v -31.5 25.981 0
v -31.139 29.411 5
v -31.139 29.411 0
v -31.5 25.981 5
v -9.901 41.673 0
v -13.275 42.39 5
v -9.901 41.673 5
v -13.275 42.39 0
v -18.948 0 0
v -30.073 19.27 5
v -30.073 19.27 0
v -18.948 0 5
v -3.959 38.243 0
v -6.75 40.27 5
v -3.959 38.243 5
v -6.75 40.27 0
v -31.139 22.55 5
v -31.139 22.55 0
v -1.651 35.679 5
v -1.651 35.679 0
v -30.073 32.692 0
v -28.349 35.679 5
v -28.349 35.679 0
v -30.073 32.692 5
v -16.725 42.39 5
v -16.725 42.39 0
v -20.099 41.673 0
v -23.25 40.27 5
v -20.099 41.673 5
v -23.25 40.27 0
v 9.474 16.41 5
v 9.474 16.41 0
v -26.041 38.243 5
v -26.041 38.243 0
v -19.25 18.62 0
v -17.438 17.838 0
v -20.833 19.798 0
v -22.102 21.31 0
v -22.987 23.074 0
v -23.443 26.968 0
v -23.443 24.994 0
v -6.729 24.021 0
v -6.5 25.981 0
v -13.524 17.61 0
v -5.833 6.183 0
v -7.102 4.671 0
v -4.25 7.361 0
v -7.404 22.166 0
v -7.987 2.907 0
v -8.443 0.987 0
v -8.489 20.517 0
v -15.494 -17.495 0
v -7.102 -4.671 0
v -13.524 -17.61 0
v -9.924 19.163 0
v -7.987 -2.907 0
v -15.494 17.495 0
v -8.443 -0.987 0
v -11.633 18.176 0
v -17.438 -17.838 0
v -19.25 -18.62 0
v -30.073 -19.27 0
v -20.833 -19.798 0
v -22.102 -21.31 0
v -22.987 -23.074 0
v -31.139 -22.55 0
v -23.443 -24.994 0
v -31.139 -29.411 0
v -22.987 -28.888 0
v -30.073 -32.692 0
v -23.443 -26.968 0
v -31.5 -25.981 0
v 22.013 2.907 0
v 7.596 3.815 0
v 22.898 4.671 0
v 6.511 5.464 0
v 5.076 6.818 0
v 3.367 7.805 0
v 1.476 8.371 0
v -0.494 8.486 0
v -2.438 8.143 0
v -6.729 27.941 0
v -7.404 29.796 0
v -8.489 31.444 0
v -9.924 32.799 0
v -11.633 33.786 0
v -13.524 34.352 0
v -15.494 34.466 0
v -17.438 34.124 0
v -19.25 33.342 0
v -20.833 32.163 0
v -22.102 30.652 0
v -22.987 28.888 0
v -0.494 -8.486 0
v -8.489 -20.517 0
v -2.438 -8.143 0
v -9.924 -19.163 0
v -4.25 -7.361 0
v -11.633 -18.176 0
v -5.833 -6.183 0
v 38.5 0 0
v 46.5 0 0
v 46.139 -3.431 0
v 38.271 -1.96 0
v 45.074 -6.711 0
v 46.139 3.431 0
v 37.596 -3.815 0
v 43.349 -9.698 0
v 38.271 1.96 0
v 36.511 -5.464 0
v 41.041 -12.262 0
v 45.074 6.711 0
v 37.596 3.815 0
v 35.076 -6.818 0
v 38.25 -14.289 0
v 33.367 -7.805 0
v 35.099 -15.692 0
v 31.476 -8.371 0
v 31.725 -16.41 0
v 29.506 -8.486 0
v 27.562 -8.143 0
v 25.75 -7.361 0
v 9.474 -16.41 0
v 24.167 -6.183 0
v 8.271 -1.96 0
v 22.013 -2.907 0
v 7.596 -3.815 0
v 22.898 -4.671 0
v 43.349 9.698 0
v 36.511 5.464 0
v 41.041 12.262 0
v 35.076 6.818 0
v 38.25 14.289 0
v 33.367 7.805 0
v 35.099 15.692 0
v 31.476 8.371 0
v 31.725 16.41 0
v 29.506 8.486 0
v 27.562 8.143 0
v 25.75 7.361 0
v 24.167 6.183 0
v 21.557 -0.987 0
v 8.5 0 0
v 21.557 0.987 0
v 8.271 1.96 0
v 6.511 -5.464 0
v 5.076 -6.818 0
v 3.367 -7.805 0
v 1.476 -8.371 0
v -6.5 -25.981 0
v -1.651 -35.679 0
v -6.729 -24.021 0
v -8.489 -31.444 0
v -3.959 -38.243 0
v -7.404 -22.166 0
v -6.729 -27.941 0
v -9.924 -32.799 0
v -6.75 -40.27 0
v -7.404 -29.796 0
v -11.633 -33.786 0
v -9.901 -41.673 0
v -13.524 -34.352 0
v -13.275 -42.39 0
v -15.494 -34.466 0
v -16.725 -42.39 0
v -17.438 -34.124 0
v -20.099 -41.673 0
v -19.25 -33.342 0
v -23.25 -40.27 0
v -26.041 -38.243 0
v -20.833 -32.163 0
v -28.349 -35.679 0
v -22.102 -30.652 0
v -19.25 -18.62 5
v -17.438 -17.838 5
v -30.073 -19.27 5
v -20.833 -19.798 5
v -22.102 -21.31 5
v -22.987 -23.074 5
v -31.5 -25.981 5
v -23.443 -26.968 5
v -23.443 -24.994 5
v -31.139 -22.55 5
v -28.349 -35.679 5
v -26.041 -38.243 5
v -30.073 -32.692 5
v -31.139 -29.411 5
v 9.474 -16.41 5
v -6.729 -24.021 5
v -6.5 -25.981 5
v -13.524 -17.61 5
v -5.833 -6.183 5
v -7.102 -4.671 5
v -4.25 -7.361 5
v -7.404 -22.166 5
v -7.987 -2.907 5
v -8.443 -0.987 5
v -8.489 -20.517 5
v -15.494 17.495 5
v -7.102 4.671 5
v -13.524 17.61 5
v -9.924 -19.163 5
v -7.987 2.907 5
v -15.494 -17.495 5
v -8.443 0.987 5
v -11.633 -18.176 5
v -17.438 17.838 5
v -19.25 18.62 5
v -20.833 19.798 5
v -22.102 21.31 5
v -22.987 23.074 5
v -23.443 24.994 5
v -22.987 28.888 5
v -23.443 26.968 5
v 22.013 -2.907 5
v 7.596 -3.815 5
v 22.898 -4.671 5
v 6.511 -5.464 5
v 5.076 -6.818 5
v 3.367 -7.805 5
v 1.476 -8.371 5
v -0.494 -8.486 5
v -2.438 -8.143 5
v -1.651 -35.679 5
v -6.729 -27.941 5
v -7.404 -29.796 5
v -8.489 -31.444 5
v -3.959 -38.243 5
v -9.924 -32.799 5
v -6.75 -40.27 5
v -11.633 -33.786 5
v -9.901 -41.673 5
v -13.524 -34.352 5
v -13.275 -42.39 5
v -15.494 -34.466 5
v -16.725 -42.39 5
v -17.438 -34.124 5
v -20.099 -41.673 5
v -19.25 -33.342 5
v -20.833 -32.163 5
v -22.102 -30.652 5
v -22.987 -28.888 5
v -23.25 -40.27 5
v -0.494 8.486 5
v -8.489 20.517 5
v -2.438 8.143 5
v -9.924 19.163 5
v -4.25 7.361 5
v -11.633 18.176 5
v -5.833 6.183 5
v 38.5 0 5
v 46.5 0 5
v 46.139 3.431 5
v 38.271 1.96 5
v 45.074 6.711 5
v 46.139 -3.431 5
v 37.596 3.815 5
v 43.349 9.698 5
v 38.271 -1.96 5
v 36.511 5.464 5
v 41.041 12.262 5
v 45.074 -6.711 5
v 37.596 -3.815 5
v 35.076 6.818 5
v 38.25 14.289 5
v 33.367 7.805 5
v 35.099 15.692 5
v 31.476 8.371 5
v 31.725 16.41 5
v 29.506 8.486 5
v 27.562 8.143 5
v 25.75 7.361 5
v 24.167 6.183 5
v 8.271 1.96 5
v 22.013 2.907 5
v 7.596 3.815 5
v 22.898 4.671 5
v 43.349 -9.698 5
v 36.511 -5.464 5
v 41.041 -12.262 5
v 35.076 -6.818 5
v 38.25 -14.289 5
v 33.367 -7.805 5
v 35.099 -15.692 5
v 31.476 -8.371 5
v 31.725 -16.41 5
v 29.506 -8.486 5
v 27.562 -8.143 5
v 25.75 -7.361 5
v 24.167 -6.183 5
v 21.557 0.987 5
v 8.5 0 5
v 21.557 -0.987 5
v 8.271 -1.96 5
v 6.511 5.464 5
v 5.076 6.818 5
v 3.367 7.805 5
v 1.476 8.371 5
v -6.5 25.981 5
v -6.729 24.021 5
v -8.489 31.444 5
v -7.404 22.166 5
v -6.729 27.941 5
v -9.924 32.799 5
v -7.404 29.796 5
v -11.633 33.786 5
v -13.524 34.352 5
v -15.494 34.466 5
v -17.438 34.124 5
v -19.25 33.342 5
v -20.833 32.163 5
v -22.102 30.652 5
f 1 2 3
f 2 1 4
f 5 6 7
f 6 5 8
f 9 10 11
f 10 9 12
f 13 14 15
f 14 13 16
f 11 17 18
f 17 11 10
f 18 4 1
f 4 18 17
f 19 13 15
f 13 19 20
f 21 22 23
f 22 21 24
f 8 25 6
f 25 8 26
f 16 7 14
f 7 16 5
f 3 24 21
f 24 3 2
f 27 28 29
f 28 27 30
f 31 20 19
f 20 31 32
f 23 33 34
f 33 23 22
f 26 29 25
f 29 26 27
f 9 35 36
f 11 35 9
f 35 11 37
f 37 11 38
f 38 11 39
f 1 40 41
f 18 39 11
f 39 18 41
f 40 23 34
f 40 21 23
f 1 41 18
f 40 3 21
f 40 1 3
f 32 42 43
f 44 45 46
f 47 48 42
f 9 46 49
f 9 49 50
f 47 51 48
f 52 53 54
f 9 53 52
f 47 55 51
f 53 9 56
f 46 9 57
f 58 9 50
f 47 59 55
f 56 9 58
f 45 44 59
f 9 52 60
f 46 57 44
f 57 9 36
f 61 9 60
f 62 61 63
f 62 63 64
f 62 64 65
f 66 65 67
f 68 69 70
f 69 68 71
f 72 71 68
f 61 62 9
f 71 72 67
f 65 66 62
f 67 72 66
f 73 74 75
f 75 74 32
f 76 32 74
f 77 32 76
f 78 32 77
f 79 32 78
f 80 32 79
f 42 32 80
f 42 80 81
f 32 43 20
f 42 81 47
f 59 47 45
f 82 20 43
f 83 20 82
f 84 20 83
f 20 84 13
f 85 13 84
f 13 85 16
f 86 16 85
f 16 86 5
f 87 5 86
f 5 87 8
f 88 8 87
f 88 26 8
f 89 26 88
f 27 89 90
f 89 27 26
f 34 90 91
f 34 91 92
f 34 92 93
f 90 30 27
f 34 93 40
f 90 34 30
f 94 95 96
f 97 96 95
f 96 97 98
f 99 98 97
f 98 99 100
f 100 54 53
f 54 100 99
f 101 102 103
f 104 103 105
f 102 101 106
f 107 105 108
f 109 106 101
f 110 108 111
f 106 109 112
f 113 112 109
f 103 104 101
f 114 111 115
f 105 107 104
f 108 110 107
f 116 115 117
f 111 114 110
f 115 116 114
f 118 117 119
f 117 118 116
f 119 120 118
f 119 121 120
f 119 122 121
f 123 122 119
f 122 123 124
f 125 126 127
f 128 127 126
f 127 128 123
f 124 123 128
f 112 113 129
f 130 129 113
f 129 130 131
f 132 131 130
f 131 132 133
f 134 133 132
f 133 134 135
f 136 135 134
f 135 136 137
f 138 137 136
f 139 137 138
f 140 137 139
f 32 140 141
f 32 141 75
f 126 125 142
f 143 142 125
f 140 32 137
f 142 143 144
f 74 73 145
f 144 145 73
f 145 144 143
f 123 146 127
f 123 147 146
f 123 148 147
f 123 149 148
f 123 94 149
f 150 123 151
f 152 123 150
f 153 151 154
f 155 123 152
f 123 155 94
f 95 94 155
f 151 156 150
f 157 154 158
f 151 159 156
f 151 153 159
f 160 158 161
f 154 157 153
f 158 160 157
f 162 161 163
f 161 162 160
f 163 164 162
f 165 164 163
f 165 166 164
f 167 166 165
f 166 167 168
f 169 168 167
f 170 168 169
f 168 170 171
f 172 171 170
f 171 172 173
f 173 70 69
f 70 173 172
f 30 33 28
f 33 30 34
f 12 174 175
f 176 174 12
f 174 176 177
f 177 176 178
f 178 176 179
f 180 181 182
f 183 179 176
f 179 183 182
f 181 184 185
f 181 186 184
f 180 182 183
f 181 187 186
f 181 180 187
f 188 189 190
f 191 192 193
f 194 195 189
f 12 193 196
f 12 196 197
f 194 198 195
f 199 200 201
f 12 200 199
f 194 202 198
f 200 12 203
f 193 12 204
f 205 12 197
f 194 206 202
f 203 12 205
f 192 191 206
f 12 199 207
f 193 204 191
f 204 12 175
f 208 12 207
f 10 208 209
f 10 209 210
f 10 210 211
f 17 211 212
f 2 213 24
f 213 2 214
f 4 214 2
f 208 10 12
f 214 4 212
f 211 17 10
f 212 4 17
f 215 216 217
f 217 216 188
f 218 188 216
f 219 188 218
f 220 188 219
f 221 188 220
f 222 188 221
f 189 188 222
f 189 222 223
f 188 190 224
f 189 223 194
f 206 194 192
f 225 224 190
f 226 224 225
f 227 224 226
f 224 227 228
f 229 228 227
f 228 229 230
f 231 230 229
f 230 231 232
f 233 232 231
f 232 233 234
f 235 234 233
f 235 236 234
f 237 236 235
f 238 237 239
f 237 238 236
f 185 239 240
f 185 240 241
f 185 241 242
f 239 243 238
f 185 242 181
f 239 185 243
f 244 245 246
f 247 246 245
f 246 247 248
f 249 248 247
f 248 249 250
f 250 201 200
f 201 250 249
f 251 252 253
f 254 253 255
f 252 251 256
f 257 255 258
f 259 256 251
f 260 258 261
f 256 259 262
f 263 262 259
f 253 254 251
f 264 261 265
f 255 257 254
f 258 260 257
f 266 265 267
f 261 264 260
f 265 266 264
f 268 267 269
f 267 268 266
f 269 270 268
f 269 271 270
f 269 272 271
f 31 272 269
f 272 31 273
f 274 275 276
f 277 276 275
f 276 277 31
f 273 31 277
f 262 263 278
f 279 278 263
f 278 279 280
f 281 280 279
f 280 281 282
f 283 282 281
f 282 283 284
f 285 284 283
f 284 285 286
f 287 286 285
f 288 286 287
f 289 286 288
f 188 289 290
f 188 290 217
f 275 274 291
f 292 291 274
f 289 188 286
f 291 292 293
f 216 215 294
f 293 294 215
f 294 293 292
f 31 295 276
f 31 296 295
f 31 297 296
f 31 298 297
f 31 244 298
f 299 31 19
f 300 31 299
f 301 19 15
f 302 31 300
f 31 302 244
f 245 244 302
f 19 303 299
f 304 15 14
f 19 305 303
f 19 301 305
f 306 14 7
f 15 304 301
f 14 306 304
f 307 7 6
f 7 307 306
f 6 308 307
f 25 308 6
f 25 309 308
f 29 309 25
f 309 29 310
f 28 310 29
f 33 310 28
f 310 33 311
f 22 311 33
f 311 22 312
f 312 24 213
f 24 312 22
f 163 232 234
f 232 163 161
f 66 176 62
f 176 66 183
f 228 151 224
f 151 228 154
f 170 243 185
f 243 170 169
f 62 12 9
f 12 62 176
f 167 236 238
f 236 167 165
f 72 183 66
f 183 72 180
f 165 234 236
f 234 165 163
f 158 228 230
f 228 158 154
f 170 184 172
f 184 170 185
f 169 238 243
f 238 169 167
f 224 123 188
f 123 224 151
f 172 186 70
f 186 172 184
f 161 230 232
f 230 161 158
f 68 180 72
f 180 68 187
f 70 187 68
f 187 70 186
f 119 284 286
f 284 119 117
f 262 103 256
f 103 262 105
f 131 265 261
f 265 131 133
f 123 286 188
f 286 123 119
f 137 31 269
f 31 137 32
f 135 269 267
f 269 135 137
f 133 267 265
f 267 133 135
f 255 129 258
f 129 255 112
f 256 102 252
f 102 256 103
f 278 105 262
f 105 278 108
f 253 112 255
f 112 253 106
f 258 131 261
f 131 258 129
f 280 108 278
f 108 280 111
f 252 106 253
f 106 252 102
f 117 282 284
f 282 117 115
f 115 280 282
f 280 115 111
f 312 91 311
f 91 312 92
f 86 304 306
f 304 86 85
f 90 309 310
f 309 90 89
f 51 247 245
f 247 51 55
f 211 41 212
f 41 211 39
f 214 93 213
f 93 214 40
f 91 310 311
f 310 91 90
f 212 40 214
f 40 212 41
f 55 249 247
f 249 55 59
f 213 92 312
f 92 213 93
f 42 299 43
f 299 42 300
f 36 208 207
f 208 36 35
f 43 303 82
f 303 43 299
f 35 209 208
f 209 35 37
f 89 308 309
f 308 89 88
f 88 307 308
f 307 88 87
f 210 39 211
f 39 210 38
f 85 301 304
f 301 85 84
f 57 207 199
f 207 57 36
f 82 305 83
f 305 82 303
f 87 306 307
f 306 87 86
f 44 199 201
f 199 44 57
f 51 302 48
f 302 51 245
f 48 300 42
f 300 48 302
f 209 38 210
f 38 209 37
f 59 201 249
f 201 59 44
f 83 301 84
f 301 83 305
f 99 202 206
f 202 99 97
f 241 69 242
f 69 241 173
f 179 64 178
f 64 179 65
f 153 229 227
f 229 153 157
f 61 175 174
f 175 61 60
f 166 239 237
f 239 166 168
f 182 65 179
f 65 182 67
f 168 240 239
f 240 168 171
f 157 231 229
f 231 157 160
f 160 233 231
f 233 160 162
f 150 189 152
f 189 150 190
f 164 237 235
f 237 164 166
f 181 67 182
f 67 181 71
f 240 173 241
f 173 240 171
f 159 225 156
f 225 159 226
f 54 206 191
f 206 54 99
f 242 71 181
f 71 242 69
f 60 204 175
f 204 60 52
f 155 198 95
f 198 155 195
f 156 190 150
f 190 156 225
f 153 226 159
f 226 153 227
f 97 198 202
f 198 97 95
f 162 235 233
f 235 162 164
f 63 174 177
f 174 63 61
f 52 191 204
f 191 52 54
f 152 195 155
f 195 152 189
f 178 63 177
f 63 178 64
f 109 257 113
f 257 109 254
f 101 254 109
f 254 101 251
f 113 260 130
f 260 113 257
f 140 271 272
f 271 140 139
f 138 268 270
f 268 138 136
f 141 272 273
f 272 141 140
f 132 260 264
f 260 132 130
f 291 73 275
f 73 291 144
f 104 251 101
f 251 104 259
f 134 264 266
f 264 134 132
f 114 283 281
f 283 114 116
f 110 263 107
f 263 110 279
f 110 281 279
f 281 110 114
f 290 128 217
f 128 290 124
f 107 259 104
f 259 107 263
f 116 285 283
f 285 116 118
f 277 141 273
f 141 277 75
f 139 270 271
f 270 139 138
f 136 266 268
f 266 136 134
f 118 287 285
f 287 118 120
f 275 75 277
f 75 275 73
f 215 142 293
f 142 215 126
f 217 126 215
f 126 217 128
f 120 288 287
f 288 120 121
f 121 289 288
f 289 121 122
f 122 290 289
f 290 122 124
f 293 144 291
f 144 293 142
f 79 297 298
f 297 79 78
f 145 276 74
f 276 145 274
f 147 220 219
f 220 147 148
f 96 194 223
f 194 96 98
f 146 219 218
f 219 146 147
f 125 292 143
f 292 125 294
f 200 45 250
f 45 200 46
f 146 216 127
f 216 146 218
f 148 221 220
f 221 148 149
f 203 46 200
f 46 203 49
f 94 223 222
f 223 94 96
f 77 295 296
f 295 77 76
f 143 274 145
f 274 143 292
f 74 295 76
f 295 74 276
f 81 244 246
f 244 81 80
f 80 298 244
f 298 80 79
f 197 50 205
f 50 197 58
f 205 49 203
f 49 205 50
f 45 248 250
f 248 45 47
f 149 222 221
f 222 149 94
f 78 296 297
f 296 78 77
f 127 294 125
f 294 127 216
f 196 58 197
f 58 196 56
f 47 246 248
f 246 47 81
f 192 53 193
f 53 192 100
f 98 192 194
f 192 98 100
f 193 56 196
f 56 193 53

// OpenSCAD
outerBearings = 3;
bearingDistance = 30;
thickness = 8;
bearingRadius = 8.5;
bearingHeight = 5;

difference(){
union(){
    
    for(i=[1:outerBearings]){
        hull(){
            rotate([0,0,(360/outerBearings)*i]){
                translate([bearingDistance,0,0]){
                    cylinder(bearingHeight, r=bearingRadius+thickness,true);
                }
                cylinder(bearingHeight, r=bearingRadius+thickness,true);
            }
        }

    }
}

union(){
    for(i=[1:outerBearings]){
        rotate([0,0,(360/outerBearings)*i]){
            translate([bearingDistance,0,0]){
                cylinder(bearingHeight, r=bearingRadius,true);
            }
        }
    }

    cylinder(bearingHeight, r=bearingRadius,true);
}}
